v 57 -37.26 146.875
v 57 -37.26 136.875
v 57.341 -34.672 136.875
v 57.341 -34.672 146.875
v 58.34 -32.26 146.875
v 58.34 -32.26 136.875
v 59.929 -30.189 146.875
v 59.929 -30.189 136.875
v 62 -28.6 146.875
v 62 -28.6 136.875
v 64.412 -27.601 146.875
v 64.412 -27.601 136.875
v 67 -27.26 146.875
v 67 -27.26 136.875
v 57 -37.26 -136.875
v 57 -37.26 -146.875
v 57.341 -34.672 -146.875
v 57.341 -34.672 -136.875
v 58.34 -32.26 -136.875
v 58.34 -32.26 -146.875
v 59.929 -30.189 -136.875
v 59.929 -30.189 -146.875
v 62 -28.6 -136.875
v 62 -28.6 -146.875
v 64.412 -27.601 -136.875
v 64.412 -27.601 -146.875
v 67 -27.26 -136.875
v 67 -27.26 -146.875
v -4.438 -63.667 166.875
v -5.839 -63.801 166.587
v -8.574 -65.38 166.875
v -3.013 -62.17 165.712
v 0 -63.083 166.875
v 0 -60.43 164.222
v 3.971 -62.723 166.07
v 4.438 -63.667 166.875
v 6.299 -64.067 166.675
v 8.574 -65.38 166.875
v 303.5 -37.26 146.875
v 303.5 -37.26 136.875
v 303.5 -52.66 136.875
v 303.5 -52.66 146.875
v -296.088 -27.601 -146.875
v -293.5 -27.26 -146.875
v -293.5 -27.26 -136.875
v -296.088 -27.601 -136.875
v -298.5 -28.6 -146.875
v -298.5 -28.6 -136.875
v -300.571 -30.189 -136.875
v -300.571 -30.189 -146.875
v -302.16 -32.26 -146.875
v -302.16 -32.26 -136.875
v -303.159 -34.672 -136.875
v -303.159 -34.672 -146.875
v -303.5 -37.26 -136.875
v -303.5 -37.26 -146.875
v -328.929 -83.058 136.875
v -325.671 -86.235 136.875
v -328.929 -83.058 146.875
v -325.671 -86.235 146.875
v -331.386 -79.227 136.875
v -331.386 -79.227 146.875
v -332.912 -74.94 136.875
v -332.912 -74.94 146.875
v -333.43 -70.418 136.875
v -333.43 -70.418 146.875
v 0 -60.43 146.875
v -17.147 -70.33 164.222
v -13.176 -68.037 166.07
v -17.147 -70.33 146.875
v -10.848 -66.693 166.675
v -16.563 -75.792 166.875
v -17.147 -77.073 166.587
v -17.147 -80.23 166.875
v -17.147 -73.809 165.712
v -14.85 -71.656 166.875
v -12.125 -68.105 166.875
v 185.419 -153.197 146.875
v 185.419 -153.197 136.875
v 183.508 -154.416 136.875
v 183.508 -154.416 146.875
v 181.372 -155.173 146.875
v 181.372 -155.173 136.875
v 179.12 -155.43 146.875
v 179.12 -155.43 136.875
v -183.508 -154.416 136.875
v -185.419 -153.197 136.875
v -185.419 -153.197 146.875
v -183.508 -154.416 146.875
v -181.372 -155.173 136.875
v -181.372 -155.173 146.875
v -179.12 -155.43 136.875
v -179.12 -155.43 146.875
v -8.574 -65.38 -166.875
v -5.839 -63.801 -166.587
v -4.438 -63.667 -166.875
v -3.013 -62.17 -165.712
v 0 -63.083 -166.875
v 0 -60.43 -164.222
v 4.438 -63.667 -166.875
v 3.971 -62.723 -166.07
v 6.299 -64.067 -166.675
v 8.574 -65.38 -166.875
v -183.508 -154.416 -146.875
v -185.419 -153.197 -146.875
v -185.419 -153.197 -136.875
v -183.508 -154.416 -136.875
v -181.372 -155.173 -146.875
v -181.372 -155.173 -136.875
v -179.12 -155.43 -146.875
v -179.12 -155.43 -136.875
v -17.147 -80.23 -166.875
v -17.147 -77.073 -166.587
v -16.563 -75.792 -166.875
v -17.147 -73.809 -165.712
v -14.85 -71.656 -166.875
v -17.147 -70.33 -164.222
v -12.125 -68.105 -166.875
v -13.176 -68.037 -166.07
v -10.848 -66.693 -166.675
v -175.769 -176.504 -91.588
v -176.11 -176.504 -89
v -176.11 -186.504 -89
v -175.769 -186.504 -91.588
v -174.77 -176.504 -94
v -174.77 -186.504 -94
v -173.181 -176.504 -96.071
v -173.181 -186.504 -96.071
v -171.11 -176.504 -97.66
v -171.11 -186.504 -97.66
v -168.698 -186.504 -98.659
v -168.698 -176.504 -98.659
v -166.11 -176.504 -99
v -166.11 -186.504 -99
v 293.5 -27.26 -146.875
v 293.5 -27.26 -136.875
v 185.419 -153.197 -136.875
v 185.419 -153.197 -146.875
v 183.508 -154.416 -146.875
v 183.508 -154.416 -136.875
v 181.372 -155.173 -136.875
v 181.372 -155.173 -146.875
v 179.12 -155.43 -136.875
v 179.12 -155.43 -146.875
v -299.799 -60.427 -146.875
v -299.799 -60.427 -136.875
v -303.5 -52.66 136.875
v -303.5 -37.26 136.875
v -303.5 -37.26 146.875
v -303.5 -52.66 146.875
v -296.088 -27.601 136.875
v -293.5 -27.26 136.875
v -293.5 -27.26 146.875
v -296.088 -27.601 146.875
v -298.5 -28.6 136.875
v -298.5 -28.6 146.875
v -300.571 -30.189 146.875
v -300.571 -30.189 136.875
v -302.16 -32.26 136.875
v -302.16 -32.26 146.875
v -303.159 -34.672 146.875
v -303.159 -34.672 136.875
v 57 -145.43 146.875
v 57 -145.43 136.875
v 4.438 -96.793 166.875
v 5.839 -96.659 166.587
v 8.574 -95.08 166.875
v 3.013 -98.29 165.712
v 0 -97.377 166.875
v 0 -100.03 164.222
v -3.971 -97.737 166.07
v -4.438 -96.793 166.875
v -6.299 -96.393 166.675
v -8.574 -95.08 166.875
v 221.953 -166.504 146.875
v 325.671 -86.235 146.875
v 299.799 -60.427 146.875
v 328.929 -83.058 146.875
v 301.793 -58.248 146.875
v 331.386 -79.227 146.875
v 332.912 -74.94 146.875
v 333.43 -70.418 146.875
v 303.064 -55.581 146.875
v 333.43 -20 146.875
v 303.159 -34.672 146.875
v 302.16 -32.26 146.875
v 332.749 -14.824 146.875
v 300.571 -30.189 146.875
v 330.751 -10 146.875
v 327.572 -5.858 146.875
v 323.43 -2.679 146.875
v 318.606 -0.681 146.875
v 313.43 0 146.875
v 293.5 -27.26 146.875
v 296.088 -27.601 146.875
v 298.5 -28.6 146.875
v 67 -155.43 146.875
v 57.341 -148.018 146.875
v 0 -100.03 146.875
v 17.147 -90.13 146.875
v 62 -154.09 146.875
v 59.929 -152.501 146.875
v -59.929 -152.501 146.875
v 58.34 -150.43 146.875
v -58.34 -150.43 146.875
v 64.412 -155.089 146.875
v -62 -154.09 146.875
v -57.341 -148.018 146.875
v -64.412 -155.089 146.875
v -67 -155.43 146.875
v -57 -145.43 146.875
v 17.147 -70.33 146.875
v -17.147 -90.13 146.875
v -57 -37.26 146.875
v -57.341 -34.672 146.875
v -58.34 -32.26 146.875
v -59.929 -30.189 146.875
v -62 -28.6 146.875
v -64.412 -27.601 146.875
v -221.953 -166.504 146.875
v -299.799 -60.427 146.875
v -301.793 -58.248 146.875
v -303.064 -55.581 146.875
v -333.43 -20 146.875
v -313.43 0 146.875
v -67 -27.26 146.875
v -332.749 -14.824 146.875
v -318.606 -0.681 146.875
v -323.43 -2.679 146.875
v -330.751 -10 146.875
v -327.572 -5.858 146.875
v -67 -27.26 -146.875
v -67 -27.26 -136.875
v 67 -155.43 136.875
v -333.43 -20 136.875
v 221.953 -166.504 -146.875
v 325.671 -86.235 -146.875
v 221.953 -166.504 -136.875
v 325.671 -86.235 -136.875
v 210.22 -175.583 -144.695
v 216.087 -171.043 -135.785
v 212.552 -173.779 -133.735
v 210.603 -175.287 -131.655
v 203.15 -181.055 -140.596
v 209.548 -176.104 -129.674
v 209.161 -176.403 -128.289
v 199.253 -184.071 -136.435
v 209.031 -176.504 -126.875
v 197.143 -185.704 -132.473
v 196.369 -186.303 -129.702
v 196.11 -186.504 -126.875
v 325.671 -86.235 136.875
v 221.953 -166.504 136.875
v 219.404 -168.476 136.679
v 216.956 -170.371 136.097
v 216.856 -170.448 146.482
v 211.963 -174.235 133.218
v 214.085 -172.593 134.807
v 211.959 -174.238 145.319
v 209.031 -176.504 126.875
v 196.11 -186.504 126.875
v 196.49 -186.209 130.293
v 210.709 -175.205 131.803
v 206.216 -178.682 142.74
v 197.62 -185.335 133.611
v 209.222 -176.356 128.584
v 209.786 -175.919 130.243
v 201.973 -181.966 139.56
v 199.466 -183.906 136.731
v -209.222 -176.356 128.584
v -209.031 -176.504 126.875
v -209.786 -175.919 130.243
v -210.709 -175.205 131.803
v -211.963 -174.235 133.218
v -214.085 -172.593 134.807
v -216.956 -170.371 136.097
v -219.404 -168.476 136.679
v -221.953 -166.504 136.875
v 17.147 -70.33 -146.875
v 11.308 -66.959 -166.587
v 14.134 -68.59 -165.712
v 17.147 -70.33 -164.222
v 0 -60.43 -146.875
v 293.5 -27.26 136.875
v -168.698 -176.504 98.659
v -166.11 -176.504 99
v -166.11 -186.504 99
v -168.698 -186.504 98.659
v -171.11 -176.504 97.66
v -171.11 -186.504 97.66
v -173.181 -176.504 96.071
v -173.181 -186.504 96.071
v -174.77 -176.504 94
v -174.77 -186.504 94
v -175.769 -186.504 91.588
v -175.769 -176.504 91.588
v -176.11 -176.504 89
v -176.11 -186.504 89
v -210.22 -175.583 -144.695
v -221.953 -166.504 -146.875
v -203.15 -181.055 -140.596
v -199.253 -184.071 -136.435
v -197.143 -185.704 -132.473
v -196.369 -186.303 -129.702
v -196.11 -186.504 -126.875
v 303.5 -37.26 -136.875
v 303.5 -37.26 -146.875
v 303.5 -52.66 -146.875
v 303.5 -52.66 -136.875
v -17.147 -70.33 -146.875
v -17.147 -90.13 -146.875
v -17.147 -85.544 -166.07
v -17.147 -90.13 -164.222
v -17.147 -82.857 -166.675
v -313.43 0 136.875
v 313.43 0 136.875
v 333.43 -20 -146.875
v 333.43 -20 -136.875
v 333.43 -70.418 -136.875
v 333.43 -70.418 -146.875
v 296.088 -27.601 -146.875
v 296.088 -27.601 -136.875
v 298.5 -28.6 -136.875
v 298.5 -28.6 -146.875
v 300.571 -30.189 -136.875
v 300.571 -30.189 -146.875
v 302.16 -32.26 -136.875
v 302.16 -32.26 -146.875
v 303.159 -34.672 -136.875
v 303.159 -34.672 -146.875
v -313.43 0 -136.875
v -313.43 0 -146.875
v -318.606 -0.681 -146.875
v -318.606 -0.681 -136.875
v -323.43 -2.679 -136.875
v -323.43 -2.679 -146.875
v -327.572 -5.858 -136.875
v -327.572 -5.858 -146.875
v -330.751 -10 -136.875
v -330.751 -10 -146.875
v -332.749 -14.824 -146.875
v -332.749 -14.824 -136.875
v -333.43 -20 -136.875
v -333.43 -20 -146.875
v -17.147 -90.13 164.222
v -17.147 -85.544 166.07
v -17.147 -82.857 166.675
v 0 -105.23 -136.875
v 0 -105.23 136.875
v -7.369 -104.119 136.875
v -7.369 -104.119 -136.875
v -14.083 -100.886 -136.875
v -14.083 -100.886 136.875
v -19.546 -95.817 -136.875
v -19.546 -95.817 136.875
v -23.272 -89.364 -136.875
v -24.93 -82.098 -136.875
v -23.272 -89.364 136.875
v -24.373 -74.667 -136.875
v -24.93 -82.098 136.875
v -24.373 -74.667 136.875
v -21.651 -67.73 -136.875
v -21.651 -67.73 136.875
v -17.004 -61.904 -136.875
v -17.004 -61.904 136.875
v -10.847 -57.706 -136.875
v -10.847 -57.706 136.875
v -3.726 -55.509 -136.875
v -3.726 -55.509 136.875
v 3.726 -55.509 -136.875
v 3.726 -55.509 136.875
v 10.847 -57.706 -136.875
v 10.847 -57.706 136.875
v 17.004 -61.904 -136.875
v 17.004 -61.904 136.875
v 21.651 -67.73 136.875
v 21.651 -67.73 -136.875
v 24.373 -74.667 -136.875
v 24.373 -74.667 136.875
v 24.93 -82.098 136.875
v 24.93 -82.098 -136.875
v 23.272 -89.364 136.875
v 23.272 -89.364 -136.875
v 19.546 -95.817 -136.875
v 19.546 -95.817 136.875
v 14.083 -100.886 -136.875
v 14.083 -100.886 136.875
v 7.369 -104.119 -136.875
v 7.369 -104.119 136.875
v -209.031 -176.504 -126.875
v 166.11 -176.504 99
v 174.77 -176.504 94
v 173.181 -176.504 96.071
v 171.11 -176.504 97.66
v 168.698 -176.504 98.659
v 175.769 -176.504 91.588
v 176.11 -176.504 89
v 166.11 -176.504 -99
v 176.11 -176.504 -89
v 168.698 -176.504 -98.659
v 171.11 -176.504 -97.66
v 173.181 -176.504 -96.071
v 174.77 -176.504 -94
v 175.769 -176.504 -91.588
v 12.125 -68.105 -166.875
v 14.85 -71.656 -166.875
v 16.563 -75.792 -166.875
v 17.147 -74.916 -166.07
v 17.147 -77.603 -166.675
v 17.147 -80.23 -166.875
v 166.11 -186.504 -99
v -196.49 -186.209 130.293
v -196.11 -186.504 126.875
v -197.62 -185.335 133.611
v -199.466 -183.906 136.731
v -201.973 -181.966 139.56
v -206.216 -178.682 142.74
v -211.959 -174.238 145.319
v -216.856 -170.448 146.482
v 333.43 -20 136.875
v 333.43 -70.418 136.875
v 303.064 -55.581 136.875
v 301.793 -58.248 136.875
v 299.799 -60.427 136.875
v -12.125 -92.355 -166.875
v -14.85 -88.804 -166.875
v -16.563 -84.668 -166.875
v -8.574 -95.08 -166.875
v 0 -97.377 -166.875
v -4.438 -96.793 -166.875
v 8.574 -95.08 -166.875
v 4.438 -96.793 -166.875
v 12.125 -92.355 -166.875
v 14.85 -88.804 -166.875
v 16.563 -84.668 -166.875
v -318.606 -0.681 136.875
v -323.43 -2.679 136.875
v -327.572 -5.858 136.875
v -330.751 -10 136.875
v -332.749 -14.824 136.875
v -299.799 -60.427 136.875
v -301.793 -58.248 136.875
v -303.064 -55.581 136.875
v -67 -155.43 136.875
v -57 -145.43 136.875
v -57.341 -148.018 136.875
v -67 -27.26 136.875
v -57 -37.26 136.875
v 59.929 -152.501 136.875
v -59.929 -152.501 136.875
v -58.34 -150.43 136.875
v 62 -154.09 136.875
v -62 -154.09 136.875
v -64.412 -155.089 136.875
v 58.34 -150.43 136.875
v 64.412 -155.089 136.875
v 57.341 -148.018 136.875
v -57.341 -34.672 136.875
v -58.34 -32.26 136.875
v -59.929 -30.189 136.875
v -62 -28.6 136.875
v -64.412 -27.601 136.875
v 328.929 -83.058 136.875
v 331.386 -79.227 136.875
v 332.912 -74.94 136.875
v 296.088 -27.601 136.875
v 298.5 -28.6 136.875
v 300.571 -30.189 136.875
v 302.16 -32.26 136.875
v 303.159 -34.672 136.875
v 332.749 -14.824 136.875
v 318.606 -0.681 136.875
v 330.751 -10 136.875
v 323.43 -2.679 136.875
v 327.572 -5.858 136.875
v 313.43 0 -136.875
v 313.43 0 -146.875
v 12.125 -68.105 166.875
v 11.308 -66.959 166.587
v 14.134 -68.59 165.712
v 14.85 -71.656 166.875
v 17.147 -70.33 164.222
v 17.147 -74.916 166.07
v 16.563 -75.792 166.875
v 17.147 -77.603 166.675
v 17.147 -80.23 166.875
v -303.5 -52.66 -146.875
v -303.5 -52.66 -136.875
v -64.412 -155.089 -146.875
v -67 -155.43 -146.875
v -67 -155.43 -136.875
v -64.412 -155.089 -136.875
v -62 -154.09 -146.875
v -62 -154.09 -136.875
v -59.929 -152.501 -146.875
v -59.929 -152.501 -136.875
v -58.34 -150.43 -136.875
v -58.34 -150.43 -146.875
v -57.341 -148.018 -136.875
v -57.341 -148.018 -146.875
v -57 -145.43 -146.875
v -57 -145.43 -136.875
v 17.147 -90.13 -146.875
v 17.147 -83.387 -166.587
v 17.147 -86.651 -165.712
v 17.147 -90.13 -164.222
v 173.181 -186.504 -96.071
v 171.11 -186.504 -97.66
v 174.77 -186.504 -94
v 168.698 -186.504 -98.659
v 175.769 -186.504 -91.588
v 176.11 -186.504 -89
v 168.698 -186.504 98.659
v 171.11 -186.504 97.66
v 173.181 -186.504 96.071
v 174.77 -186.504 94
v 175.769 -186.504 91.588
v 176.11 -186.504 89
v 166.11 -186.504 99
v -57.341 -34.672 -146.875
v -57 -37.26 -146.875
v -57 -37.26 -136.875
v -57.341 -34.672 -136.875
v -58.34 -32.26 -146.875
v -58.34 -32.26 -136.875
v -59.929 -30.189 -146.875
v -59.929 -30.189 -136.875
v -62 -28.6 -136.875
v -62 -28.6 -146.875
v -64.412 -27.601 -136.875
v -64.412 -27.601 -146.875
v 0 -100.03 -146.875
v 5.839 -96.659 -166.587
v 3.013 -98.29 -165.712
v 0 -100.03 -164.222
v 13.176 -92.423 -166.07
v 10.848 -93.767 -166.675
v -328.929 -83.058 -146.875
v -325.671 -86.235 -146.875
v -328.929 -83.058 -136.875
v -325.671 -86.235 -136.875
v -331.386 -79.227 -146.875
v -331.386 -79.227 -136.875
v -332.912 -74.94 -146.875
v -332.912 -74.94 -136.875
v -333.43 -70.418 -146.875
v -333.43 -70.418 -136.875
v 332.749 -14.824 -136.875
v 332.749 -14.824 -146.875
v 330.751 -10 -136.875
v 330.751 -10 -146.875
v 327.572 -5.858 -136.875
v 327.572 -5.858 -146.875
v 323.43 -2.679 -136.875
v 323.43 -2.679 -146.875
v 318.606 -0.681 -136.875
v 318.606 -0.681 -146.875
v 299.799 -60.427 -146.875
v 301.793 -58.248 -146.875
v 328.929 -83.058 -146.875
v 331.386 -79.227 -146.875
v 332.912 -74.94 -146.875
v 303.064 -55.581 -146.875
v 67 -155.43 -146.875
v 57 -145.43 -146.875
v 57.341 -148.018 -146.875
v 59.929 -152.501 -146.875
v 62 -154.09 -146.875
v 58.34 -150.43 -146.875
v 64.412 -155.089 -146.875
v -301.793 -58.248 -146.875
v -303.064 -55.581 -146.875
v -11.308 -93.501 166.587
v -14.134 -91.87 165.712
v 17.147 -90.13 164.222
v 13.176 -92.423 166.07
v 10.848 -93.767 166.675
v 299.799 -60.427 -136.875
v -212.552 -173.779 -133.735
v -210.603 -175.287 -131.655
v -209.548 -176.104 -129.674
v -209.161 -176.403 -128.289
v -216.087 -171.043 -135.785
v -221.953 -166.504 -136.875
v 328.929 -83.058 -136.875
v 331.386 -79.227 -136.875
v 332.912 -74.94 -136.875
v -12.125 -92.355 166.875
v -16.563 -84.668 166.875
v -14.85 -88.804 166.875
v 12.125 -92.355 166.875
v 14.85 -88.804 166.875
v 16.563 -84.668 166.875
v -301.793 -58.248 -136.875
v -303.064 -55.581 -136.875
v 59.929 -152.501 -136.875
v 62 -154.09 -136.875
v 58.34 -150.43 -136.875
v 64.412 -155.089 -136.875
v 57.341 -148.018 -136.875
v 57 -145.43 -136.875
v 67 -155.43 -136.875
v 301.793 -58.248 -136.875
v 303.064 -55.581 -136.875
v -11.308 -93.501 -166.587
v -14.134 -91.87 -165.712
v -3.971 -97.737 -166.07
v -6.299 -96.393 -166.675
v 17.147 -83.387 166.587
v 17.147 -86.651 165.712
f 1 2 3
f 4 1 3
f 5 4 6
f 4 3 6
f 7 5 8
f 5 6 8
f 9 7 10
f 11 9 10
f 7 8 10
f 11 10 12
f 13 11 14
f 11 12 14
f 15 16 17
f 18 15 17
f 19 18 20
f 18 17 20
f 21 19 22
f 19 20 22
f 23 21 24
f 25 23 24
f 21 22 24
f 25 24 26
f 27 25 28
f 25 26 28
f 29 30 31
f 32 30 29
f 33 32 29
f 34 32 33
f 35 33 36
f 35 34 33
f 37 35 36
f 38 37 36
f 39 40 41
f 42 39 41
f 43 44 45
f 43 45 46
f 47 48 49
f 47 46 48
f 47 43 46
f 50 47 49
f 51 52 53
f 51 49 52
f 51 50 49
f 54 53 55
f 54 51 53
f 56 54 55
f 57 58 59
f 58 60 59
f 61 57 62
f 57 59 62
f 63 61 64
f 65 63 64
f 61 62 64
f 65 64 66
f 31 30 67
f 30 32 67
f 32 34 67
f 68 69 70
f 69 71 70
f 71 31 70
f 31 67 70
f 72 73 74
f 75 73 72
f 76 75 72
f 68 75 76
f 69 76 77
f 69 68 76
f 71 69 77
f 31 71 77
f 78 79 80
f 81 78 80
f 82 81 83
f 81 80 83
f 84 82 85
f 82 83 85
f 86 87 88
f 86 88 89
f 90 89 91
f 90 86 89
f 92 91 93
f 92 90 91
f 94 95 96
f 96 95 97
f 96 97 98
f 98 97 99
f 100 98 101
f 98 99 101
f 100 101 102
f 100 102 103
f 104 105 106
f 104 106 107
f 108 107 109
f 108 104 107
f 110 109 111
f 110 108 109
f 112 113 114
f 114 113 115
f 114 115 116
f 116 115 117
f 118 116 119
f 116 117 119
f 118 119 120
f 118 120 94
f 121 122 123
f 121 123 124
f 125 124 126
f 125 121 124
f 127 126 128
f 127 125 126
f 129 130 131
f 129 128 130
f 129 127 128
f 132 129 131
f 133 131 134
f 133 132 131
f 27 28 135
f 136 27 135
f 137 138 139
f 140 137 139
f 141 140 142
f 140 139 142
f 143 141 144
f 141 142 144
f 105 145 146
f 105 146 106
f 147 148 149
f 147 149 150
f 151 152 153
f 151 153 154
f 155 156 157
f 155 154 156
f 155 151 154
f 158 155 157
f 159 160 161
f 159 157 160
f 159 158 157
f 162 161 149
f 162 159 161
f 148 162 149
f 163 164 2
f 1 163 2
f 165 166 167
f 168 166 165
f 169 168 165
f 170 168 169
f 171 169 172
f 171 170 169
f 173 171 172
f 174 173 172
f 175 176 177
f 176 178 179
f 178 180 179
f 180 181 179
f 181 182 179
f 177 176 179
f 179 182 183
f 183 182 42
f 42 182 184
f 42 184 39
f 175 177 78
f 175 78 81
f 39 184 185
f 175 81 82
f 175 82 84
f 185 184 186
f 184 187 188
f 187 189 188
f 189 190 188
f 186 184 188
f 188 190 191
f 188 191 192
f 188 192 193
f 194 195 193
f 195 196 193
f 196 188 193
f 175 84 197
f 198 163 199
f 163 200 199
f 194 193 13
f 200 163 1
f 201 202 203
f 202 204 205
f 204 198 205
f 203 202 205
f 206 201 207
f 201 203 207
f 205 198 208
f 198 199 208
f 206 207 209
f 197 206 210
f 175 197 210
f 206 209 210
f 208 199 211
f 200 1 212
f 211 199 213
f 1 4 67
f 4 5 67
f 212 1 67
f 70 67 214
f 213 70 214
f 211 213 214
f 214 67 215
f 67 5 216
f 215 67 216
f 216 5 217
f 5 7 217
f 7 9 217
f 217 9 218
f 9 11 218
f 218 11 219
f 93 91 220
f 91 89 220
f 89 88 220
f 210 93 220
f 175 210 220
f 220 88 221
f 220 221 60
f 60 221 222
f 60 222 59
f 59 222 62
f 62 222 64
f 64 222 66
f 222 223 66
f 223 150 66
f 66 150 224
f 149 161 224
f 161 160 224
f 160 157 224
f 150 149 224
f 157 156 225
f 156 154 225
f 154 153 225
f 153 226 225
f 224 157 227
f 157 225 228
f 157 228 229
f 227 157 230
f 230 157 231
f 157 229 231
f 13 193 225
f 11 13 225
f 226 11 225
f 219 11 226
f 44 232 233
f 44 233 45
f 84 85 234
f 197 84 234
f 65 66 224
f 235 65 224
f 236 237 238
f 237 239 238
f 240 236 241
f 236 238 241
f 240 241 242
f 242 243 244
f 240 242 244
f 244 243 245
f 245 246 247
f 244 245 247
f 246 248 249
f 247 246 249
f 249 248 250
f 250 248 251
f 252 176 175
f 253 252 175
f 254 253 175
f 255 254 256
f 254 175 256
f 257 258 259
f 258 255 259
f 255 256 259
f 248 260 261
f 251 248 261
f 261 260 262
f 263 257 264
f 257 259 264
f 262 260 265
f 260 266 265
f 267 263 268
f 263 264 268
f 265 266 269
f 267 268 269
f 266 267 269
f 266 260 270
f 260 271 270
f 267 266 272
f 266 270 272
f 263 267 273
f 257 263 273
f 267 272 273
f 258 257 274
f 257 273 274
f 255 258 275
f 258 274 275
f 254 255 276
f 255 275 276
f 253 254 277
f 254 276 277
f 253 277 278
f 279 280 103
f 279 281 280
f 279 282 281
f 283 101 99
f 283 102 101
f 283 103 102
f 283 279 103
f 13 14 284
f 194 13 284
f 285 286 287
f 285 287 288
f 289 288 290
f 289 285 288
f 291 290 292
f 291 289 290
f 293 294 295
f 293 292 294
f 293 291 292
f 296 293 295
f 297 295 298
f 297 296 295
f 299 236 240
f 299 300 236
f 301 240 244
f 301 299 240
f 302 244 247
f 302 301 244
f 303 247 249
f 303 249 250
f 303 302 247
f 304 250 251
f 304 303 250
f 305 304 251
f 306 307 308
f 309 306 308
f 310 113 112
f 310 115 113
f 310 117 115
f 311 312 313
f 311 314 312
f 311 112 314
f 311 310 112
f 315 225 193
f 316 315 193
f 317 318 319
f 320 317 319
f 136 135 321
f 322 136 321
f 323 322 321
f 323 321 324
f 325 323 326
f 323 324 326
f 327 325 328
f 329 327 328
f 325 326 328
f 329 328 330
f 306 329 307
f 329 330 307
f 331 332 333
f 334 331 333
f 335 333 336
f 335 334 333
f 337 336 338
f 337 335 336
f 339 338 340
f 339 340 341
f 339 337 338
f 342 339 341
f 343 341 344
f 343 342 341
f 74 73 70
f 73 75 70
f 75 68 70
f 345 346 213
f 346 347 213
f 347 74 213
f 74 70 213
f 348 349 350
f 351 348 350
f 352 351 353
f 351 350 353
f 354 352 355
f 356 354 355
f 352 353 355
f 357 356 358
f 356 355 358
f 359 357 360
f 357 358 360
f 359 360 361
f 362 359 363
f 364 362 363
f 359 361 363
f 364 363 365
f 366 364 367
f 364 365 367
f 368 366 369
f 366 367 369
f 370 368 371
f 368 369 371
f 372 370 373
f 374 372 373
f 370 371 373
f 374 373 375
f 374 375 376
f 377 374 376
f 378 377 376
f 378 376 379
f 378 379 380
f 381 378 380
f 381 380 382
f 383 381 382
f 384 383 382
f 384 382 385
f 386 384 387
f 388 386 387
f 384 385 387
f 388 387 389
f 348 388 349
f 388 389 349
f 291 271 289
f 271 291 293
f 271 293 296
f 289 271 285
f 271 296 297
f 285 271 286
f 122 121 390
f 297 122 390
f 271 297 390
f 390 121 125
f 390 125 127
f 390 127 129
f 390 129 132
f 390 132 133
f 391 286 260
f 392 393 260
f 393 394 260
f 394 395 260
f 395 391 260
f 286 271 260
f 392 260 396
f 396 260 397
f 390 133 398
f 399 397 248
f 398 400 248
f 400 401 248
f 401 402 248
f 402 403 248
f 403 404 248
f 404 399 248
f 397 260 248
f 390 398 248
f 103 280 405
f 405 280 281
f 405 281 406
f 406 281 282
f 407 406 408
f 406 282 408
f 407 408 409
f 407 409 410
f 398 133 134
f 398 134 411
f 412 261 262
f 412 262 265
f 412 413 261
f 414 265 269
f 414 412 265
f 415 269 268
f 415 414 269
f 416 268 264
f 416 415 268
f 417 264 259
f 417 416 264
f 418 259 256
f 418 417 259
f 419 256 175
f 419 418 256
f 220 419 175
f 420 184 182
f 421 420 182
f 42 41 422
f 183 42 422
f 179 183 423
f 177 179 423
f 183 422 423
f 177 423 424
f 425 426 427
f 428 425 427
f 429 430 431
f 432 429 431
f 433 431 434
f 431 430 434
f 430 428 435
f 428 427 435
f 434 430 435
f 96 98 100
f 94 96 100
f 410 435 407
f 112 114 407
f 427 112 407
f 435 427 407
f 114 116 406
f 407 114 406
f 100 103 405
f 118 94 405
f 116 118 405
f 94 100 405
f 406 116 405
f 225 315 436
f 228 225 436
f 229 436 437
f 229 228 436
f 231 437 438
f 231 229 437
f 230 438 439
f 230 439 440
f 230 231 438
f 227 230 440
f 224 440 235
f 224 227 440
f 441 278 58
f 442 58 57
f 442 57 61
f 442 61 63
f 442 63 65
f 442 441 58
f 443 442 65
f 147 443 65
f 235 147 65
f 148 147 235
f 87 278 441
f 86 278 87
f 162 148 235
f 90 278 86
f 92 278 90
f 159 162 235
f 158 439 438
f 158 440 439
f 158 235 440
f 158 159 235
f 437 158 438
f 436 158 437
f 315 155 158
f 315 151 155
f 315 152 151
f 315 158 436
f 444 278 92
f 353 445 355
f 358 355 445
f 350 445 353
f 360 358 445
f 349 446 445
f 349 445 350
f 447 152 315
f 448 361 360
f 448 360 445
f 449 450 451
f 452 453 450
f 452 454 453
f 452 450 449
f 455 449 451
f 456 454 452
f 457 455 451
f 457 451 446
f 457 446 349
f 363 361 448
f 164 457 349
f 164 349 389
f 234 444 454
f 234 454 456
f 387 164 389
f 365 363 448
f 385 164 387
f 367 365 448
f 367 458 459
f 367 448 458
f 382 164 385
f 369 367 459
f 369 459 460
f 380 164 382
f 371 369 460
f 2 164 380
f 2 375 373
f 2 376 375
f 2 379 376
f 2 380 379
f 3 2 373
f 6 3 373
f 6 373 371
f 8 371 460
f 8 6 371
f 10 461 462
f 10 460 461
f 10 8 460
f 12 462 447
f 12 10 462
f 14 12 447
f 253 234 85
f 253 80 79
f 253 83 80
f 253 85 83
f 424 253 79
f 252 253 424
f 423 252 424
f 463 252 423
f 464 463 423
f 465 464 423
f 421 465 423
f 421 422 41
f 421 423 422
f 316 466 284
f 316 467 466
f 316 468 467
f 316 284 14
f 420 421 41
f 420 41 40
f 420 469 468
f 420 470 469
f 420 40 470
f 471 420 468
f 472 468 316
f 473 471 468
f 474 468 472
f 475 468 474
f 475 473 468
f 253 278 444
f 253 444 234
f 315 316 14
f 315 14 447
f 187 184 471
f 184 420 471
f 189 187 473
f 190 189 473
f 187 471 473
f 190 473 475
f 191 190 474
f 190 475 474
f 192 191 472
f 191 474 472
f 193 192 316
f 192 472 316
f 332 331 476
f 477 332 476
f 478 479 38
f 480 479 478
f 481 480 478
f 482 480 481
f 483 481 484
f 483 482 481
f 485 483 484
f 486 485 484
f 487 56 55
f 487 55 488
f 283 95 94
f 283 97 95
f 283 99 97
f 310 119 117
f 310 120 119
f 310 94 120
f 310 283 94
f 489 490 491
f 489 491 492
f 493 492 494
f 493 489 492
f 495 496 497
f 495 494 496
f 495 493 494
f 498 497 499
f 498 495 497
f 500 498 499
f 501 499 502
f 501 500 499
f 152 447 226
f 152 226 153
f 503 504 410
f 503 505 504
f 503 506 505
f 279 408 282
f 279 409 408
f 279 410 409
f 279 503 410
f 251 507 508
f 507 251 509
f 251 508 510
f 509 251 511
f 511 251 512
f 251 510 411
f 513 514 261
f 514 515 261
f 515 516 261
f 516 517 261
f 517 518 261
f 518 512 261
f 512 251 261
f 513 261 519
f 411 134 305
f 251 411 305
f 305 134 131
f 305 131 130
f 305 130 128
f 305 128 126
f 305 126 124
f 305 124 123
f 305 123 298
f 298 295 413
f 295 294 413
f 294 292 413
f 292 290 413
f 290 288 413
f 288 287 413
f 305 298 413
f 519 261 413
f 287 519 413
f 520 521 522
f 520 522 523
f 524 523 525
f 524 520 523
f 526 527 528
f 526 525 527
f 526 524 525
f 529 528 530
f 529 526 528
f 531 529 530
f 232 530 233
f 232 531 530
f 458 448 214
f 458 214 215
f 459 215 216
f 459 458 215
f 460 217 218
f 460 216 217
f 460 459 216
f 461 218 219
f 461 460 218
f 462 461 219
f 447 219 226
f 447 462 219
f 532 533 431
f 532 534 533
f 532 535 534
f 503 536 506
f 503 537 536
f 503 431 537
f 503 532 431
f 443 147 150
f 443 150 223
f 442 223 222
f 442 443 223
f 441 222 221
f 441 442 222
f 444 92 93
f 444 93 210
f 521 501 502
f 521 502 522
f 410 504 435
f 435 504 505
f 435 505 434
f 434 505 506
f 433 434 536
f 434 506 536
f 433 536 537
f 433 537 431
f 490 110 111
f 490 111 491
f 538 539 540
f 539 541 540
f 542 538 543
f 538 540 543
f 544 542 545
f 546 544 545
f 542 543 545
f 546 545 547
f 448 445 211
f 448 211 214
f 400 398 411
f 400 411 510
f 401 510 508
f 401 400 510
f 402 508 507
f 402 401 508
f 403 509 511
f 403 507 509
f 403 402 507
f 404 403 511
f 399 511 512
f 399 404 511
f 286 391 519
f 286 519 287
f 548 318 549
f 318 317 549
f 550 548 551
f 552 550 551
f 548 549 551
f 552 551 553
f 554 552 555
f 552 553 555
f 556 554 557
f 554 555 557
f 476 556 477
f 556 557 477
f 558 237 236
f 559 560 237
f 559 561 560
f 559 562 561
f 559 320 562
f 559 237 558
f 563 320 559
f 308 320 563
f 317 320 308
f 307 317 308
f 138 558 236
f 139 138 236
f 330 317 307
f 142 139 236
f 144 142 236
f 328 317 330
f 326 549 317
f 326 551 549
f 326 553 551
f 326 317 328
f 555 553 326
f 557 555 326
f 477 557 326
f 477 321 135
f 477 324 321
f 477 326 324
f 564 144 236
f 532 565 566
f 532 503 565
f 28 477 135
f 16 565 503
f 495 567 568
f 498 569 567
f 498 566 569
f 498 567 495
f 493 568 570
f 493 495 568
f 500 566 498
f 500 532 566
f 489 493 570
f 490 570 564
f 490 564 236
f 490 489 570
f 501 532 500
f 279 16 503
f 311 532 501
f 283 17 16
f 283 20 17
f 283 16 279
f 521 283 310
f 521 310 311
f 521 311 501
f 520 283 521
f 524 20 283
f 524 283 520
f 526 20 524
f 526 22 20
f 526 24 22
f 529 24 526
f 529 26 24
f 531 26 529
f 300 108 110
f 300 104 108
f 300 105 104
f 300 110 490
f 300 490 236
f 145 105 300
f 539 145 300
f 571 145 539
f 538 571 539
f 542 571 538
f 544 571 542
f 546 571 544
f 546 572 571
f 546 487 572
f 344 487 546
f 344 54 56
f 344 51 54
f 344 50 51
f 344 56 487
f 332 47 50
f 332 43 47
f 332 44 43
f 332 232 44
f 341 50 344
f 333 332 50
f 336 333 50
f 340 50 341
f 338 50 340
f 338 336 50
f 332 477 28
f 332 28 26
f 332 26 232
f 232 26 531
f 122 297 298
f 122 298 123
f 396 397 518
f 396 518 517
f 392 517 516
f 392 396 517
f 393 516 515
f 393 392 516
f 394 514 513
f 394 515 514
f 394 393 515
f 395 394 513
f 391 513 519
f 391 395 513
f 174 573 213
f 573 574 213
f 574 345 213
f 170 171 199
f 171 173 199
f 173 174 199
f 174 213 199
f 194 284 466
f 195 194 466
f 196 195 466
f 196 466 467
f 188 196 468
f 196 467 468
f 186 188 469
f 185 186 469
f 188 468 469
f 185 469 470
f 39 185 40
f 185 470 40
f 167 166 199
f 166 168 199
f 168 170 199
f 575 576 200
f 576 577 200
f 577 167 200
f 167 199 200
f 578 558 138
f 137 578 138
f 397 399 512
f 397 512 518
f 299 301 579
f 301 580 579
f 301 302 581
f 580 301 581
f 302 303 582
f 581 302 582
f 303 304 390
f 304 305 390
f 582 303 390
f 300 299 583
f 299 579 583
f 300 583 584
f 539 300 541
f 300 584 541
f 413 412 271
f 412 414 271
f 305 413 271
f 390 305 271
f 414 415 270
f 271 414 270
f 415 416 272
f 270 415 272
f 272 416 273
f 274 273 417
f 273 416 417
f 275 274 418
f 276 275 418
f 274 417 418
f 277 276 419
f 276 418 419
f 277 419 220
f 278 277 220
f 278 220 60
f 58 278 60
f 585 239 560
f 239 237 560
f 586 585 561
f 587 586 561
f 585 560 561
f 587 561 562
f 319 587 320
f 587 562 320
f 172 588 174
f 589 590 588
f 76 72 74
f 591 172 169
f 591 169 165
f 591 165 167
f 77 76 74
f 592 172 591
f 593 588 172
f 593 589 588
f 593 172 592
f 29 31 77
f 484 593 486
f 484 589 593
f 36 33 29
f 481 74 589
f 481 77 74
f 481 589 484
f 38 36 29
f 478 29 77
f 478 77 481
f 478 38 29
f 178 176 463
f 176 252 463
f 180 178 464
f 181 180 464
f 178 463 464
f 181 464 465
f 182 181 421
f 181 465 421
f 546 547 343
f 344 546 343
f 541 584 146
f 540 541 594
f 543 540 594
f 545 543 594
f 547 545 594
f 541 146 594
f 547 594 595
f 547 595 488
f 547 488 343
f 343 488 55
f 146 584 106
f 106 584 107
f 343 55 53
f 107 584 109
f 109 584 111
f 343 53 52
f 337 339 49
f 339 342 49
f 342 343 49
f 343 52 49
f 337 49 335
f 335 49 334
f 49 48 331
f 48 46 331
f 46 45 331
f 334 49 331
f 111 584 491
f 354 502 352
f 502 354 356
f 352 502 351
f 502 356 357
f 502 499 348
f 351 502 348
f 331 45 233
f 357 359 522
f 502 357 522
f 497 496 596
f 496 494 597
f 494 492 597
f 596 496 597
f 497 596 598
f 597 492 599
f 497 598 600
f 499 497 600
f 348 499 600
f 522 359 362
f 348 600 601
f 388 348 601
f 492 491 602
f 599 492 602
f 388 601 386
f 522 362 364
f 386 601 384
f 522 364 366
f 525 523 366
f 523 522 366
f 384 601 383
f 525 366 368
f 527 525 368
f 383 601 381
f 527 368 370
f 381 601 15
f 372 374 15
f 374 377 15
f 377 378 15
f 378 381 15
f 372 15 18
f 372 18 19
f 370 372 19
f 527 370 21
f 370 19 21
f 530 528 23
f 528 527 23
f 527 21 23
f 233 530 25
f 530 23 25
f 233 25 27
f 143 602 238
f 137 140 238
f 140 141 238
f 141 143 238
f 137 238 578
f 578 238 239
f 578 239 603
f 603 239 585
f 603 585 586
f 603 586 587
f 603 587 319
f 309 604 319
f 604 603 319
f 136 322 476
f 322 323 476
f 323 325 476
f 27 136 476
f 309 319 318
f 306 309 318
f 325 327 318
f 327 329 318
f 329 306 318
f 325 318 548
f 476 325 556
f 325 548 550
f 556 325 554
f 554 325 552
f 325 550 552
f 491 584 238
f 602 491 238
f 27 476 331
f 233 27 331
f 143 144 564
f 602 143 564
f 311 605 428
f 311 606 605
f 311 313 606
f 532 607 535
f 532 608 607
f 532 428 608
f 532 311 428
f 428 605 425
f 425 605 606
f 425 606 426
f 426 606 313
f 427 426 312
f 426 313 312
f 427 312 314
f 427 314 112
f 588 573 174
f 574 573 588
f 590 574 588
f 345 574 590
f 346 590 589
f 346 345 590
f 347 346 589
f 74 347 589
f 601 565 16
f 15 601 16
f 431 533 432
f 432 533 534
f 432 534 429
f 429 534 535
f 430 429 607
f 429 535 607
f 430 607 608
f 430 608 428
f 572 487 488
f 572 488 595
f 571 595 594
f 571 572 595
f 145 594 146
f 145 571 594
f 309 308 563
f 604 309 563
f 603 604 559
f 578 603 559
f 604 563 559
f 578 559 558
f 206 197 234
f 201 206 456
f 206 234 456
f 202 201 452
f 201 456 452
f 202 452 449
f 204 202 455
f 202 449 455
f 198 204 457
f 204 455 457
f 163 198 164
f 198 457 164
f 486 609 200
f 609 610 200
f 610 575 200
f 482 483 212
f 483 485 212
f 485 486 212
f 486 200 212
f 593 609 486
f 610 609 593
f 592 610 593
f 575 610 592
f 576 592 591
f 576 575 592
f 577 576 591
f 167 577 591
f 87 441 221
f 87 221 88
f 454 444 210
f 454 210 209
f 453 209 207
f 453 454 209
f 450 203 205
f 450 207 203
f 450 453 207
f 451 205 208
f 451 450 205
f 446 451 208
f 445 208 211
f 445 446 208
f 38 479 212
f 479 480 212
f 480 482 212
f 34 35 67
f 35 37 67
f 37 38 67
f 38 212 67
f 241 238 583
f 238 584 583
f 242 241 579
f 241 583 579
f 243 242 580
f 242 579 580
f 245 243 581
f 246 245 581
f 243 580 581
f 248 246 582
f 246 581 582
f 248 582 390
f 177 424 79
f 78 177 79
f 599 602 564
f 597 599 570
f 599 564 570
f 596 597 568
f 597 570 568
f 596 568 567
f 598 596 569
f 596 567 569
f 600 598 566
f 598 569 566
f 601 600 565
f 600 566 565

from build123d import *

# Parameters (mm, degrees)
BOSS_EXTRUDE1_DEPTH     = 146.875
SKETCH2_W               = 273.75
SKETCH2_H               = 213.261995914
CUT_EXTRUDE1_DEPTH      = 708.854574743
FILLET1_R               = 10
FILLET2_R               = 20
SKETCH3_R               = 25
BOSS_EXTRUDE2_DEPTH     = 273.75
BOSS_EXTRUDE3_DEPTH     = 20
SKETCH5_R               = 51.111383935
SKETCH5_R_2             = 17.147302995
CUT_EXTRUDE2_DEPTH      = 20
CUT_EXTRUDE2_TAPER      = 45
CUT_EXTRUDE3_DEPTH      = 495.366464437
CUT_EXTRUDE3_DEPTH_BACK = 495.366464437
CUT_EXTRUDE4_DEPTH      = 417.900952607
CUT_EXTRUDE4_DEPTH_BACK = 10
FILLET3_R               = 20


with BuildPart() as part:
    # Sketch1 → Boss-Extrude1 (new, symmetric)
    with BuildSketch(Plane.XY):
        Polygon((-333.43, 0), (333.43, 0), (333.43, -80.23), (196.11, -186.50354892), (-196.11, -186.50354892), (-333.43, -80.23), align=None)
    extrude(amount=BOSS_EXTRUDE1_DEPTH, both=True)

    # Sketch2 → Cut-Extrude1 (cut, through all)
    with BuildSketch(Plane(origin=(333.43, 0, 0), x_dir=(0, 0, -1), z_dir=(1, 0, 0))):
        with Locations((0, -69.872550963)):
            Rectangle(SKETCH2_W, SKETCH2_H)
    extrude(amount=-CUT_EXTRUDE1_DEPTH, mode=Mode.SUBTRACT)

    # Fillet1
    fillet1_edges = [part.edges().sort_by_distance(p)[0] for p in [
        (0, -176.50354892, -136.875),
        (0, -176.50354892, 136.875),
    ]]
    fillet(fillet1_edges, radius=FILLET1_R)

    # Fillet2
    fillet2_edges = [part.edges().sort_by_distance(p)[0] for p in [
        (0, -186.50354892, -146.875),
        (0, -186.50354892, 146.875),
    ]]
    fillet(fillet2_edges, radius=FILLET2_R)

    # Sketch3 → Boss-Extrude2 (add)
    with BuildSketch(Plane(origin=(0, 0, 136.875), x_dir=(-1, 0, 0), z_dir=(0, 0, -1))):
        with Locations(Location((0, -80.23, 0), (0, 0, 270))):
            Circle(SKETCH3_R)
    extrude(amount=BOSS_EXTRUDE2_DEPTH)

    # Sketch4 → Boss-Extrude3 (add)
    with BuildSketch(Plane.XY.offset(146.875)):
        Polygon((0, -100.03), (17.147302995, -90.13), (17.147302995, -70.33), (0, -60.43), (-17.147302995, -70.33), (-17.147302995, -90.13), align=None)
    boss_extrude3 = extrude(amount=BOSS_EXTRUDE3_DEPTH)

    # Sketch5 → Cut-Extrude2 (cut)
    with BuildSketch(Plane.XY.offset(166.875)):
        with Locations((0, -80.23)):
            Circle(SKETCH5_R)
        with Locations((0, -80.23)):
            Circle(SKETCH5_R_2, mode=Mode.SUBTRACT)
    cut_extrude2 = extrude(amount=-CUT_EXTRUDE2_DEPTH, taper=CUT_EXTRUDE2_TAPER, mode=Mode.SUBTRACT)

    # Mirror1: Boss-Extrude3, Cut-Extrude2 across plane
    add(boss_extrude3.mirror(Plane.XY))
    add(cut_extrude2.mirror(Plane.XY), mode=Mode.SUBTRACT)

    # Sketch6 → Cut-Extrude3 (cut, two sides: drawn at the far end of the back side and taken through both)
    with BuildSketch(Plane.XY.offset(146.875).offset(-CUT_EXTRUDE3_DEPTH_BACK)):
        with BuildLine():
            Line((-303.5, -37.26), (-303.5, -52.66))
            ThreePointArc((-303.5, -52.66), (-302.527520815, -56.961612248), (-299.799226414, -60.426578821))
            Line((-299.799226414, -60.426578821), (-185.419226414, -153.196578821))
            ThreePointArc((-185.419226414, -153.196578821), (-182.461721995, -154.855120376), (-179.12, -155.43))
            Line((-179.12, -155.43), (-67, -155.43))
            ThreePointArc((-67, -155.43), (-59.928932188, -152.501067812), (-57, -145.43))
            Line((-57, -145.43), (-57, -37.26))
            ThreePointArc((-57, -37.26), (-59.928932188, -30.188932188), (-67, -27.26))
            Line((-67, -27.26), (-293.5, -27.26))
            ThreePointArc((-293.5, -27.26), (-300.571067812, -30.188932188), (-303.5, -37.26))
        make_face()
        with BuildLine():
            Line((57, -145.43), (57, -37.26))
            ThreePointArc((57, -37.26), (59.928932188, -30.188932188), (67, -27.26))
            Line((67, -27.26), (293.5, -27.26))
            ThreePointArc((293.5, -27.26), (300.571067812, -30.188932188), (303.5, -37.26))
            Line((303.5, -37.26), (303.5, -52.66))
            ThreePointArc((303.5, -52.66), (302.527520815, -56.961612248), (299.799226414, -60.426578821))
            Line((299.799226414, -60.426578821), (185.419226414, -153.196578821))
            ThreePointArc((185.419226414, -153.196578821), (182.461721995, -154.855120376), (179.12, -155.43))
            Line((179.12, -155.43), (67, -155.43))
            ThreePointArc((67, -155.43), (59.928932188, -152.501067812), (57, -145.43))
        make_face()
    extrude(amount=CUT_EXTRUDE3_DEPTH + CUT_EXTRUDE3_DEPTH_BACK, mode=Mode.SUBTRACT)

    # Sketch7 → Cut-Extrude4 (cut, two sides: drawn at the far end of the back side and taken through both)
    with BuildSketch(Plane.XZ.offset(186.50354892).offset(-CUT_EXTRUDE4_DEPTH_BACK)):
        with BuildLine():
            Line((166.11, 99), (-166.11, 99))
            ThreePointArc((-166.11, 99), (-173.181067812, 96.071067812), (-176.11, 89))
            Line((-176.11, 89), (-176.11, -89))
            ThreePointArc((-176.11, -89), (-173.181067812, -96.071067812), (-166.11, -99))
            Line((-166.11, -99), (166.11, -99))
            ThreePointArc((166.11, -99), (173.181067812, -96.071067812), (176.11, -89))
            Line((176.11, -89), (176.11, 89))
            ThreePointArc((176.11, 89), (173.181067812, 96.071067812), (166.11, 99))
        make_face()
    extrude(amount=CUT_EXTRUDE4_DEPTH + CUT_EXTRUDE4_DEPTH_BACK, mode=Mode.SUBTRACT)

    # Fillet3
    fillet3_edges = [part.edges().sort_by_distance(p)[0] for p in [
        (-333.43, -80.23, 141.875),
        (-333.43, 0, 141.875),
        (333.43, 0, 141.875),
        (333.43, -80.23, 141.875),
        (-333.43, -80.23, -141.875),
        (-333.43, 0, -141.875),
        (333.43, 0, -141.875),
        (333.43, -80.23, -141.875),
    ]]
    fillet(fillet3_edges, radius=FILLET3_R)


solid = part.part
